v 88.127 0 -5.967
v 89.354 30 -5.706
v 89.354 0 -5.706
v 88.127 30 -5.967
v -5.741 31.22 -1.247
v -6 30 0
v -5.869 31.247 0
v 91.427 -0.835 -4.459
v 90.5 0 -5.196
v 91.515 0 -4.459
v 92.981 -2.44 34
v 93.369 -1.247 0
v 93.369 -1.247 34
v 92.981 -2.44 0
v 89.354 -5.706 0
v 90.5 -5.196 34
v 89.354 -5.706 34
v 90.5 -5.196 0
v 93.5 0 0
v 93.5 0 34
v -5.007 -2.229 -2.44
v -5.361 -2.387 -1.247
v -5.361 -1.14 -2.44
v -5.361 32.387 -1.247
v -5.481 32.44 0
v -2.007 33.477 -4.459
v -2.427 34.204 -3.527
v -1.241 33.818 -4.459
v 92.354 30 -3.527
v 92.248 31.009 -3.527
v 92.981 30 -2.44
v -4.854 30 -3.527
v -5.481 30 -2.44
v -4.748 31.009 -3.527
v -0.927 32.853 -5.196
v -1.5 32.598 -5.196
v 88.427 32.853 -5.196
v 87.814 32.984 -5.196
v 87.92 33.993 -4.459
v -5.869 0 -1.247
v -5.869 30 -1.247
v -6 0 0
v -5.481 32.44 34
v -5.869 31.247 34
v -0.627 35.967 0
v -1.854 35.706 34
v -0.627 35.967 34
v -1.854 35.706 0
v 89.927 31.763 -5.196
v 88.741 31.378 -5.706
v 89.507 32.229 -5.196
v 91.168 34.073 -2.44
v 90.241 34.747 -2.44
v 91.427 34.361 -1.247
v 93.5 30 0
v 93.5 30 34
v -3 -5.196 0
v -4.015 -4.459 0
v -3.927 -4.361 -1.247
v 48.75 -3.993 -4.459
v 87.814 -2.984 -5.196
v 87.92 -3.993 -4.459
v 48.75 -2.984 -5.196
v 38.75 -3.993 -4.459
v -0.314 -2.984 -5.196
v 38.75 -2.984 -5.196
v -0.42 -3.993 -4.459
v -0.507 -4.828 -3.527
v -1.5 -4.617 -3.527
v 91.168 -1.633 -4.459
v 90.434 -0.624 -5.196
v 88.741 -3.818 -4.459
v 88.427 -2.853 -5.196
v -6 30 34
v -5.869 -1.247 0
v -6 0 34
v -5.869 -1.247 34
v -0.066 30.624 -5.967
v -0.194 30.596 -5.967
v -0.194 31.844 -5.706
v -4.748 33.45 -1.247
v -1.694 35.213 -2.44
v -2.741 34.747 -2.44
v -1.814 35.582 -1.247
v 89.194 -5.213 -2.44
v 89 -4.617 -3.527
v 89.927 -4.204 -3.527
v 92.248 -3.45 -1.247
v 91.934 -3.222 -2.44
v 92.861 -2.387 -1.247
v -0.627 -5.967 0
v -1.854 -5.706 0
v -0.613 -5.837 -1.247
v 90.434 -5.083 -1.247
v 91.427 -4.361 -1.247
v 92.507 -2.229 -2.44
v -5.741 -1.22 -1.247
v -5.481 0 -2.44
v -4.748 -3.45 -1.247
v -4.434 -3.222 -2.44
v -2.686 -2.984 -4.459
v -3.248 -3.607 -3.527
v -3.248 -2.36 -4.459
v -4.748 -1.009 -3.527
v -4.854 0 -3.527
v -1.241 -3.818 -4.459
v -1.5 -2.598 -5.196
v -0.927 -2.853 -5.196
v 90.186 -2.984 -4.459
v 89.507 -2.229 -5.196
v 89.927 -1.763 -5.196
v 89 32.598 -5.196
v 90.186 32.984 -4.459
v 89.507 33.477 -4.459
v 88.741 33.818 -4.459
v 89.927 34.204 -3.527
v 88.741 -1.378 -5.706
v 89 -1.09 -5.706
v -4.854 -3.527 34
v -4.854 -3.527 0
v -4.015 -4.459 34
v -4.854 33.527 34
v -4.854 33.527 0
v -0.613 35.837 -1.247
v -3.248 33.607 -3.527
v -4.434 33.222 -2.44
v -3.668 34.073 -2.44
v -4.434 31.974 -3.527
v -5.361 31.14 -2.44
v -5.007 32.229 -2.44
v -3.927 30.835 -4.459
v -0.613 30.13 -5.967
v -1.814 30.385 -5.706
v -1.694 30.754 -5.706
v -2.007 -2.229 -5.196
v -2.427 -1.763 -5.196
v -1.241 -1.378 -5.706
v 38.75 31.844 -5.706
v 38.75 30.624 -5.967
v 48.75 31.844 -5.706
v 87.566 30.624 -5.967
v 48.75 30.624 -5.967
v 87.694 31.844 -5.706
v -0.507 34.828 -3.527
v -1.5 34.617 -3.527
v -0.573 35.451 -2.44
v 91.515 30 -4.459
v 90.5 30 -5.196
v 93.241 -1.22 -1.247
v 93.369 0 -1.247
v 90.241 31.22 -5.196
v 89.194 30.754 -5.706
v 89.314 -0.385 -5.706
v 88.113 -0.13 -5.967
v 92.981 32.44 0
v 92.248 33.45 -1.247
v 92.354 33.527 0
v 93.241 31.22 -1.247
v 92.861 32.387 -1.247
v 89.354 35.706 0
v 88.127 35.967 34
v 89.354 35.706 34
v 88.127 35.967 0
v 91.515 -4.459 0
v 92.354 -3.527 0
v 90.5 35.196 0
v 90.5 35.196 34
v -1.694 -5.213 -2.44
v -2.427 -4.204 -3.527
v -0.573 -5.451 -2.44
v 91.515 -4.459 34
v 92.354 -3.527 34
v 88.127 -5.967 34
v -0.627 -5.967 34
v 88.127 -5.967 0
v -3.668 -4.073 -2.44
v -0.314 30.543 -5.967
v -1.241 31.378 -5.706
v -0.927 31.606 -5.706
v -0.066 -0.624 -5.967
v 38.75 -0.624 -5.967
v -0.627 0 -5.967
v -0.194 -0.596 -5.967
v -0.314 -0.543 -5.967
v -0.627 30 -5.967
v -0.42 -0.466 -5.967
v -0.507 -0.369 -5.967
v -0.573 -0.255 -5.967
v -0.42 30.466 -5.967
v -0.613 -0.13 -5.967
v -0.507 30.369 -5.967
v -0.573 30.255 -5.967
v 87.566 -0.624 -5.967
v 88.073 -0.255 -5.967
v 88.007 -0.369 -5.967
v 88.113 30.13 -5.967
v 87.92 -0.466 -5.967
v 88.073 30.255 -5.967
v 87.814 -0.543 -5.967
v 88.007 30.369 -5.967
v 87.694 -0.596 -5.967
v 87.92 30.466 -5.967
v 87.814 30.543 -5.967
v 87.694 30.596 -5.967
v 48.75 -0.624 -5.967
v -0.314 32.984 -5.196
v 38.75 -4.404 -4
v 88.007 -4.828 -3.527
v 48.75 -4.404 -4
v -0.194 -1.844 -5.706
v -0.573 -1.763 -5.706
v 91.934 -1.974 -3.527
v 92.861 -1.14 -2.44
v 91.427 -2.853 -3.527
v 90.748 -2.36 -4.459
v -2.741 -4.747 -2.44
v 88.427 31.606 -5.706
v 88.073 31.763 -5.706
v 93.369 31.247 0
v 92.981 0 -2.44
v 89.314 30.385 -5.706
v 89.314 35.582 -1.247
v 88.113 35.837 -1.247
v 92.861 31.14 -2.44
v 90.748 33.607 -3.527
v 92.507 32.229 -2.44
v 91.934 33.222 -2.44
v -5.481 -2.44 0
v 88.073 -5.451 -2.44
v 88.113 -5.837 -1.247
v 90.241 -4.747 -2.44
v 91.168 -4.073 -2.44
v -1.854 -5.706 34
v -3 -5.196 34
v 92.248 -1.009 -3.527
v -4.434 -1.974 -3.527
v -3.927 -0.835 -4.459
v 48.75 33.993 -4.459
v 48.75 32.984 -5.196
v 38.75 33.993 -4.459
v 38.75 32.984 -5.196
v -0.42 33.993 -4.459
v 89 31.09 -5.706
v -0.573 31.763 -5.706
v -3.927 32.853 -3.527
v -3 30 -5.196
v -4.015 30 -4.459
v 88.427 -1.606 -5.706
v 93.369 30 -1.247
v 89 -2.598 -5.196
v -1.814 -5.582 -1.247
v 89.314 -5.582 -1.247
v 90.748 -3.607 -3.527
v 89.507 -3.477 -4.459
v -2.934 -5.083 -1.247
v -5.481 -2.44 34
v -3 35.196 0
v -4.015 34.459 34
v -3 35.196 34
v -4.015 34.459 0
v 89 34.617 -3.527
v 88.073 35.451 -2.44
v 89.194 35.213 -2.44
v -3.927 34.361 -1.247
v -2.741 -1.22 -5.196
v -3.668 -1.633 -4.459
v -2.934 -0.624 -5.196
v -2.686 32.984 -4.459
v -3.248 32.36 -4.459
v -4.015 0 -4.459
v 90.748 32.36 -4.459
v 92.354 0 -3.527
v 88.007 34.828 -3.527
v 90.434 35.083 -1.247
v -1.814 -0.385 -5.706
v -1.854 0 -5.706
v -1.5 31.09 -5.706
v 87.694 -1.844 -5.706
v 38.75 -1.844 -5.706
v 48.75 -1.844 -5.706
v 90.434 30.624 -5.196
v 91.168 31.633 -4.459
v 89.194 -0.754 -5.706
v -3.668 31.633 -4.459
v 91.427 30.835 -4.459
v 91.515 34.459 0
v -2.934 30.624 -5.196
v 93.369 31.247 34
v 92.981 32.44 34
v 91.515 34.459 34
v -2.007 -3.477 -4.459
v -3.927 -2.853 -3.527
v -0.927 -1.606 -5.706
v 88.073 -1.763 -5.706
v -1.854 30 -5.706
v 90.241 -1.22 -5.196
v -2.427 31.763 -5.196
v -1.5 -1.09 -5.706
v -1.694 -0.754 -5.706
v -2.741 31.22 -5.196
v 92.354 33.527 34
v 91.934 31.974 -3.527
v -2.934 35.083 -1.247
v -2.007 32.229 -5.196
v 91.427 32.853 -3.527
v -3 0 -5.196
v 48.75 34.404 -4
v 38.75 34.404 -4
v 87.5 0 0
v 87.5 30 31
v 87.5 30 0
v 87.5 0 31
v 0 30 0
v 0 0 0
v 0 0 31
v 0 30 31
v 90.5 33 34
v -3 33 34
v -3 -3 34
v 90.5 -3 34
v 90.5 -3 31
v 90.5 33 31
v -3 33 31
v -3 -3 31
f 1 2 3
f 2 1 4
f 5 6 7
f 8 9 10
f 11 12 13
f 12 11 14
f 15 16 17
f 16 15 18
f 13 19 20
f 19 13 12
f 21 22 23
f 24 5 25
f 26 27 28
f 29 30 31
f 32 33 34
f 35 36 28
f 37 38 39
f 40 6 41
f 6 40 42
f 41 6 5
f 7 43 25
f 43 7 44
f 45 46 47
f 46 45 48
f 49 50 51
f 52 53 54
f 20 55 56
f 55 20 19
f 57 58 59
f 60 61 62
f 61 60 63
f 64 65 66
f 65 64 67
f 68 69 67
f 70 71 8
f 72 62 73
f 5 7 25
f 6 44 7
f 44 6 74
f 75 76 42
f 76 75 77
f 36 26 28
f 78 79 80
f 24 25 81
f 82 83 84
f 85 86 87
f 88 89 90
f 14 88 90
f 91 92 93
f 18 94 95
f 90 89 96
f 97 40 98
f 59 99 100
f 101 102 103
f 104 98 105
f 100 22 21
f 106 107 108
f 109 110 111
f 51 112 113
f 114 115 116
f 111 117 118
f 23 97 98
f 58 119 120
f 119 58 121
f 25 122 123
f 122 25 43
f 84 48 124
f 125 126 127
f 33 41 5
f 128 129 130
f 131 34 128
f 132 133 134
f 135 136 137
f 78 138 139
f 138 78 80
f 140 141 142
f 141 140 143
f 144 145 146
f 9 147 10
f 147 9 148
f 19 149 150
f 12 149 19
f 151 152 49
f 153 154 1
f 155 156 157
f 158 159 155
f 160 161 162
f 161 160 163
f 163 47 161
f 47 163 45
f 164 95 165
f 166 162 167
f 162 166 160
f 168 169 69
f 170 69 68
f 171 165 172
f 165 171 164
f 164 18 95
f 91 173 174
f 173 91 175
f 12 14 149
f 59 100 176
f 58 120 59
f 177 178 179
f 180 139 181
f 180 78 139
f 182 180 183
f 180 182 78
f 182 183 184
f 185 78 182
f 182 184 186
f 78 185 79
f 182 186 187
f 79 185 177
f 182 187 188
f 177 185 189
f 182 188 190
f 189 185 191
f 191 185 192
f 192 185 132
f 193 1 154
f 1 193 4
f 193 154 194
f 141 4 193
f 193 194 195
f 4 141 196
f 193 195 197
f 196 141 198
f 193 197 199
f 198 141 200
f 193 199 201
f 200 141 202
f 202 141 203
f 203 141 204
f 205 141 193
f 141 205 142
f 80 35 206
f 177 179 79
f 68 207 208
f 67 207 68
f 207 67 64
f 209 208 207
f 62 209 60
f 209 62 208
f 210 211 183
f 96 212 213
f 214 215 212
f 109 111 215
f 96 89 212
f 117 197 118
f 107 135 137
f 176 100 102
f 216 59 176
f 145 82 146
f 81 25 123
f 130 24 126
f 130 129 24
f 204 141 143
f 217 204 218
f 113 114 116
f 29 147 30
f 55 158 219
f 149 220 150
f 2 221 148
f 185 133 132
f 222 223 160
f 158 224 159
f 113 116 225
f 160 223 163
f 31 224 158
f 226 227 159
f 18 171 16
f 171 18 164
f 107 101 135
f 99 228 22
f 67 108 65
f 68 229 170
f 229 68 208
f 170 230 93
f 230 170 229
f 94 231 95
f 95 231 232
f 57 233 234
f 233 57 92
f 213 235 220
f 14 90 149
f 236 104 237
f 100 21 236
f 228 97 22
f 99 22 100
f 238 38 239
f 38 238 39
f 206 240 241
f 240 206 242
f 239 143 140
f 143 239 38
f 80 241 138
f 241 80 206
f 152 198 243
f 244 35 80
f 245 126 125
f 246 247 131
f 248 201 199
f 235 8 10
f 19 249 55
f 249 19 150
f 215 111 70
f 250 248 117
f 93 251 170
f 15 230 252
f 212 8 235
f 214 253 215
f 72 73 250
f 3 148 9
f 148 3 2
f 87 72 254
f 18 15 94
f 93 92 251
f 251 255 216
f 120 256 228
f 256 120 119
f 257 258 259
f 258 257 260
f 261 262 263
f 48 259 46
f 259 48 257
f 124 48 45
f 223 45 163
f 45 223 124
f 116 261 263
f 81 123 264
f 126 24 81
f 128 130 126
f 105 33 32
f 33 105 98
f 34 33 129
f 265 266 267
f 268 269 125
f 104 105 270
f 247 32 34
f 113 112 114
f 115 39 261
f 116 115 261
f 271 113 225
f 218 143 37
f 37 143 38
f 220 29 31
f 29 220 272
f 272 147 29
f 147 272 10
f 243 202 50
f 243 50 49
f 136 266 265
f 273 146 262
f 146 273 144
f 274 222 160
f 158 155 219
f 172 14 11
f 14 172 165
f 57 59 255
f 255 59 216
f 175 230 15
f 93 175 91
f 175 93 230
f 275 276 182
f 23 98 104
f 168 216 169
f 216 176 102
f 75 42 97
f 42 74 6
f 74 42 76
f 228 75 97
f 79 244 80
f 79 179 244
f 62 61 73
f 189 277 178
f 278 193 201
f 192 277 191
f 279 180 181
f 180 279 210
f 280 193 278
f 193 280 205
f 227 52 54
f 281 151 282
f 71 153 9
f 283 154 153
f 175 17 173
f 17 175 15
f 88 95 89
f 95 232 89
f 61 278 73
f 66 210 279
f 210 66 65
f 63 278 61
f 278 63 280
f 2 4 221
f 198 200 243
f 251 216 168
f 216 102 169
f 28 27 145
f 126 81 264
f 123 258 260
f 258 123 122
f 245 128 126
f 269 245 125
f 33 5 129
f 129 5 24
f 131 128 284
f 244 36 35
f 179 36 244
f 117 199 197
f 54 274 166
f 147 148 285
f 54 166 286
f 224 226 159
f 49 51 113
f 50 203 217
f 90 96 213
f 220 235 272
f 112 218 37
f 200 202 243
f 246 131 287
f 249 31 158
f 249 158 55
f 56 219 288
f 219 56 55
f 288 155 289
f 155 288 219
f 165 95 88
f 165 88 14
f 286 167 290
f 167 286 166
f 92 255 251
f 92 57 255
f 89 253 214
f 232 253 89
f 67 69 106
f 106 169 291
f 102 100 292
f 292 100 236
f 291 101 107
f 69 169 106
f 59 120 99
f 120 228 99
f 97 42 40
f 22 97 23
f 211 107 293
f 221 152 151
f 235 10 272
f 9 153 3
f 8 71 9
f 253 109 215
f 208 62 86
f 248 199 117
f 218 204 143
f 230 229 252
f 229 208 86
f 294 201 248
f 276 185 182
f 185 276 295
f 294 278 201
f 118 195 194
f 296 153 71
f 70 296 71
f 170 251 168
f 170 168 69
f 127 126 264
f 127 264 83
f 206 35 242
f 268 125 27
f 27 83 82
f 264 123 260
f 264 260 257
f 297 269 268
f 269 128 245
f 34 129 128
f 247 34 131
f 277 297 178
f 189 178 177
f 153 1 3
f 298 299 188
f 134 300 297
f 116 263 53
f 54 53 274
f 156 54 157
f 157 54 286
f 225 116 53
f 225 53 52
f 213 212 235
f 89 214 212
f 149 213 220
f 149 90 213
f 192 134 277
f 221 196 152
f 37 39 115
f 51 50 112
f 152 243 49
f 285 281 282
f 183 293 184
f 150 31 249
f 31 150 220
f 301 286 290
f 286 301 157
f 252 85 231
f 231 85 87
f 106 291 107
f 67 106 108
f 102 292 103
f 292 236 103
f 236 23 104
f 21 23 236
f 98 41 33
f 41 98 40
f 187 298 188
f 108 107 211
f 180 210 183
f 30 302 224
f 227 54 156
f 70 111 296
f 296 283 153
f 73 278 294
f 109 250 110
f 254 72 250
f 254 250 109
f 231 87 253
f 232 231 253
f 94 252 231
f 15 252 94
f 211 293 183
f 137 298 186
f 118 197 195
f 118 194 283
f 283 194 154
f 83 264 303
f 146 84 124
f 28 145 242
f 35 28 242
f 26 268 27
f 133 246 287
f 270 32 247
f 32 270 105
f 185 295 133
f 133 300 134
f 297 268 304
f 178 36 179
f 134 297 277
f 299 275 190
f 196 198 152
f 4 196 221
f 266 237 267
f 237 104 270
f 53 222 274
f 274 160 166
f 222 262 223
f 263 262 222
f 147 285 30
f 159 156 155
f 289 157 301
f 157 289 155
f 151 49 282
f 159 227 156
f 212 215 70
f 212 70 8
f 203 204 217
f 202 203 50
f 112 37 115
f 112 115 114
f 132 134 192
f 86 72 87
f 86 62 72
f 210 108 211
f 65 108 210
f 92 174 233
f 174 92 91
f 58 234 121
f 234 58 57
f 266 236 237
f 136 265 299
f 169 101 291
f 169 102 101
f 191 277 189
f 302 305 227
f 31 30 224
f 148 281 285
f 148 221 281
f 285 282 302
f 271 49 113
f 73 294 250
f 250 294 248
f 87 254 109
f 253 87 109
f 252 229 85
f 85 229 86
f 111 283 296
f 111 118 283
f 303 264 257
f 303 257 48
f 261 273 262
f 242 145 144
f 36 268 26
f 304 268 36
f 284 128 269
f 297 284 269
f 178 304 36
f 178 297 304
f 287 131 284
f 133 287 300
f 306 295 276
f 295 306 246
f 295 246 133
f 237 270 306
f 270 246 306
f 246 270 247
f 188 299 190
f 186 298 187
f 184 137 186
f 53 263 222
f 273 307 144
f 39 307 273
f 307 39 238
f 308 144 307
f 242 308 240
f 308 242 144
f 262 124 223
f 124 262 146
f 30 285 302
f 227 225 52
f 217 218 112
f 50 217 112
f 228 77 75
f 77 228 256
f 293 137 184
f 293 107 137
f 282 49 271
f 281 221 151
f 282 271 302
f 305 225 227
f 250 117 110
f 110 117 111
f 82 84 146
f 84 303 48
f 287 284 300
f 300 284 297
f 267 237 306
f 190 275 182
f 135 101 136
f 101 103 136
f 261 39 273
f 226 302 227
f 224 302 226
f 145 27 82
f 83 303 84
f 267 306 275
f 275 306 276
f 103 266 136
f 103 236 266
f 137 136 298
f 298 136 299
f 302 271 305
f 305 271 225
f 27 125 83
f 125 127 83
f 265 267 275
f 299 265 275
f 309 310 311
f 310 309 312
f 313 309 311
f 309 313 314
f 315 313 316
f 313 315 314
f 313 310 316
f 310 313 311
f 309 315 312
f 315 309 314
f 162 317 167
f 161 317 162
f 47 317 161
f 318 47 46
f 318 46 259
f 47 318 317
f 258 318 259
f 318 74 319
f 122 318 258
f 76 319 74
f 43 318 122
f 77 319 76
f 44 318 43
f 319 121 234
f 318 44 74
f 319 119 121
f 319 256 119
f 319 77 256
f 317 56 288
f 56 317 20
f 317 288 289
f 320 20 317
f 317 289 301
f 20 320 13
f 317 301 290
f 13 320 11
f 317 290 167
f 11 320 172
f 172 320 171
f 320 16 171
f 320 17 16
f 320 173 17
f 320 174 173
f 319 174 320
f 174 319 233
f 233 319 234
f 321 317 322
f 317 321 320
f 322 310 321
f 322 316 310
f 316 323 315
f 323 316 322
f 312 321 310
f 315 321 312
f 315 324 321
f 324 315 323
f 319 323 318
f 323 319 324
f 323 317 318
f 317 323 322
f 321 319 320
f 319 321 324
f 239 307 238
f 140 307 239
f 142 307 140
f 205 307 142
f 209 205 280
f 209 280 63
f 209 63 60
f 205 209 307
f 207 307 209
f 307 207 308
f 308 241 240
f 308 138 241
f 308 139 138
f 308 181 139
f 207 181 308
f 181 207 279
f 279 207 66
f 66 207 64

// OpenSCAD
difference () {
  translate ([43.75, 15.0, 61/2]) {
    difference () {
      minkowski () {
        cube ([87.5, 30.0, 61], center=true);
        sphere ($fn=30, r=6);
      }
      cube ([87.5, 30.0, 61], center=true);
    }
  }
  union () {
    translate ([0, 0, 134]) {
      cube ([200, 200, 200], center=true);
    }
    translate ([43.75, 15.0, 134]) {
      cube ([93.5, 36.0, 206], center=true);
    }
  }
  translate ([43.75, 0, -5]) {
    cube ([10, 1000, 2], center=true);
  }
}
